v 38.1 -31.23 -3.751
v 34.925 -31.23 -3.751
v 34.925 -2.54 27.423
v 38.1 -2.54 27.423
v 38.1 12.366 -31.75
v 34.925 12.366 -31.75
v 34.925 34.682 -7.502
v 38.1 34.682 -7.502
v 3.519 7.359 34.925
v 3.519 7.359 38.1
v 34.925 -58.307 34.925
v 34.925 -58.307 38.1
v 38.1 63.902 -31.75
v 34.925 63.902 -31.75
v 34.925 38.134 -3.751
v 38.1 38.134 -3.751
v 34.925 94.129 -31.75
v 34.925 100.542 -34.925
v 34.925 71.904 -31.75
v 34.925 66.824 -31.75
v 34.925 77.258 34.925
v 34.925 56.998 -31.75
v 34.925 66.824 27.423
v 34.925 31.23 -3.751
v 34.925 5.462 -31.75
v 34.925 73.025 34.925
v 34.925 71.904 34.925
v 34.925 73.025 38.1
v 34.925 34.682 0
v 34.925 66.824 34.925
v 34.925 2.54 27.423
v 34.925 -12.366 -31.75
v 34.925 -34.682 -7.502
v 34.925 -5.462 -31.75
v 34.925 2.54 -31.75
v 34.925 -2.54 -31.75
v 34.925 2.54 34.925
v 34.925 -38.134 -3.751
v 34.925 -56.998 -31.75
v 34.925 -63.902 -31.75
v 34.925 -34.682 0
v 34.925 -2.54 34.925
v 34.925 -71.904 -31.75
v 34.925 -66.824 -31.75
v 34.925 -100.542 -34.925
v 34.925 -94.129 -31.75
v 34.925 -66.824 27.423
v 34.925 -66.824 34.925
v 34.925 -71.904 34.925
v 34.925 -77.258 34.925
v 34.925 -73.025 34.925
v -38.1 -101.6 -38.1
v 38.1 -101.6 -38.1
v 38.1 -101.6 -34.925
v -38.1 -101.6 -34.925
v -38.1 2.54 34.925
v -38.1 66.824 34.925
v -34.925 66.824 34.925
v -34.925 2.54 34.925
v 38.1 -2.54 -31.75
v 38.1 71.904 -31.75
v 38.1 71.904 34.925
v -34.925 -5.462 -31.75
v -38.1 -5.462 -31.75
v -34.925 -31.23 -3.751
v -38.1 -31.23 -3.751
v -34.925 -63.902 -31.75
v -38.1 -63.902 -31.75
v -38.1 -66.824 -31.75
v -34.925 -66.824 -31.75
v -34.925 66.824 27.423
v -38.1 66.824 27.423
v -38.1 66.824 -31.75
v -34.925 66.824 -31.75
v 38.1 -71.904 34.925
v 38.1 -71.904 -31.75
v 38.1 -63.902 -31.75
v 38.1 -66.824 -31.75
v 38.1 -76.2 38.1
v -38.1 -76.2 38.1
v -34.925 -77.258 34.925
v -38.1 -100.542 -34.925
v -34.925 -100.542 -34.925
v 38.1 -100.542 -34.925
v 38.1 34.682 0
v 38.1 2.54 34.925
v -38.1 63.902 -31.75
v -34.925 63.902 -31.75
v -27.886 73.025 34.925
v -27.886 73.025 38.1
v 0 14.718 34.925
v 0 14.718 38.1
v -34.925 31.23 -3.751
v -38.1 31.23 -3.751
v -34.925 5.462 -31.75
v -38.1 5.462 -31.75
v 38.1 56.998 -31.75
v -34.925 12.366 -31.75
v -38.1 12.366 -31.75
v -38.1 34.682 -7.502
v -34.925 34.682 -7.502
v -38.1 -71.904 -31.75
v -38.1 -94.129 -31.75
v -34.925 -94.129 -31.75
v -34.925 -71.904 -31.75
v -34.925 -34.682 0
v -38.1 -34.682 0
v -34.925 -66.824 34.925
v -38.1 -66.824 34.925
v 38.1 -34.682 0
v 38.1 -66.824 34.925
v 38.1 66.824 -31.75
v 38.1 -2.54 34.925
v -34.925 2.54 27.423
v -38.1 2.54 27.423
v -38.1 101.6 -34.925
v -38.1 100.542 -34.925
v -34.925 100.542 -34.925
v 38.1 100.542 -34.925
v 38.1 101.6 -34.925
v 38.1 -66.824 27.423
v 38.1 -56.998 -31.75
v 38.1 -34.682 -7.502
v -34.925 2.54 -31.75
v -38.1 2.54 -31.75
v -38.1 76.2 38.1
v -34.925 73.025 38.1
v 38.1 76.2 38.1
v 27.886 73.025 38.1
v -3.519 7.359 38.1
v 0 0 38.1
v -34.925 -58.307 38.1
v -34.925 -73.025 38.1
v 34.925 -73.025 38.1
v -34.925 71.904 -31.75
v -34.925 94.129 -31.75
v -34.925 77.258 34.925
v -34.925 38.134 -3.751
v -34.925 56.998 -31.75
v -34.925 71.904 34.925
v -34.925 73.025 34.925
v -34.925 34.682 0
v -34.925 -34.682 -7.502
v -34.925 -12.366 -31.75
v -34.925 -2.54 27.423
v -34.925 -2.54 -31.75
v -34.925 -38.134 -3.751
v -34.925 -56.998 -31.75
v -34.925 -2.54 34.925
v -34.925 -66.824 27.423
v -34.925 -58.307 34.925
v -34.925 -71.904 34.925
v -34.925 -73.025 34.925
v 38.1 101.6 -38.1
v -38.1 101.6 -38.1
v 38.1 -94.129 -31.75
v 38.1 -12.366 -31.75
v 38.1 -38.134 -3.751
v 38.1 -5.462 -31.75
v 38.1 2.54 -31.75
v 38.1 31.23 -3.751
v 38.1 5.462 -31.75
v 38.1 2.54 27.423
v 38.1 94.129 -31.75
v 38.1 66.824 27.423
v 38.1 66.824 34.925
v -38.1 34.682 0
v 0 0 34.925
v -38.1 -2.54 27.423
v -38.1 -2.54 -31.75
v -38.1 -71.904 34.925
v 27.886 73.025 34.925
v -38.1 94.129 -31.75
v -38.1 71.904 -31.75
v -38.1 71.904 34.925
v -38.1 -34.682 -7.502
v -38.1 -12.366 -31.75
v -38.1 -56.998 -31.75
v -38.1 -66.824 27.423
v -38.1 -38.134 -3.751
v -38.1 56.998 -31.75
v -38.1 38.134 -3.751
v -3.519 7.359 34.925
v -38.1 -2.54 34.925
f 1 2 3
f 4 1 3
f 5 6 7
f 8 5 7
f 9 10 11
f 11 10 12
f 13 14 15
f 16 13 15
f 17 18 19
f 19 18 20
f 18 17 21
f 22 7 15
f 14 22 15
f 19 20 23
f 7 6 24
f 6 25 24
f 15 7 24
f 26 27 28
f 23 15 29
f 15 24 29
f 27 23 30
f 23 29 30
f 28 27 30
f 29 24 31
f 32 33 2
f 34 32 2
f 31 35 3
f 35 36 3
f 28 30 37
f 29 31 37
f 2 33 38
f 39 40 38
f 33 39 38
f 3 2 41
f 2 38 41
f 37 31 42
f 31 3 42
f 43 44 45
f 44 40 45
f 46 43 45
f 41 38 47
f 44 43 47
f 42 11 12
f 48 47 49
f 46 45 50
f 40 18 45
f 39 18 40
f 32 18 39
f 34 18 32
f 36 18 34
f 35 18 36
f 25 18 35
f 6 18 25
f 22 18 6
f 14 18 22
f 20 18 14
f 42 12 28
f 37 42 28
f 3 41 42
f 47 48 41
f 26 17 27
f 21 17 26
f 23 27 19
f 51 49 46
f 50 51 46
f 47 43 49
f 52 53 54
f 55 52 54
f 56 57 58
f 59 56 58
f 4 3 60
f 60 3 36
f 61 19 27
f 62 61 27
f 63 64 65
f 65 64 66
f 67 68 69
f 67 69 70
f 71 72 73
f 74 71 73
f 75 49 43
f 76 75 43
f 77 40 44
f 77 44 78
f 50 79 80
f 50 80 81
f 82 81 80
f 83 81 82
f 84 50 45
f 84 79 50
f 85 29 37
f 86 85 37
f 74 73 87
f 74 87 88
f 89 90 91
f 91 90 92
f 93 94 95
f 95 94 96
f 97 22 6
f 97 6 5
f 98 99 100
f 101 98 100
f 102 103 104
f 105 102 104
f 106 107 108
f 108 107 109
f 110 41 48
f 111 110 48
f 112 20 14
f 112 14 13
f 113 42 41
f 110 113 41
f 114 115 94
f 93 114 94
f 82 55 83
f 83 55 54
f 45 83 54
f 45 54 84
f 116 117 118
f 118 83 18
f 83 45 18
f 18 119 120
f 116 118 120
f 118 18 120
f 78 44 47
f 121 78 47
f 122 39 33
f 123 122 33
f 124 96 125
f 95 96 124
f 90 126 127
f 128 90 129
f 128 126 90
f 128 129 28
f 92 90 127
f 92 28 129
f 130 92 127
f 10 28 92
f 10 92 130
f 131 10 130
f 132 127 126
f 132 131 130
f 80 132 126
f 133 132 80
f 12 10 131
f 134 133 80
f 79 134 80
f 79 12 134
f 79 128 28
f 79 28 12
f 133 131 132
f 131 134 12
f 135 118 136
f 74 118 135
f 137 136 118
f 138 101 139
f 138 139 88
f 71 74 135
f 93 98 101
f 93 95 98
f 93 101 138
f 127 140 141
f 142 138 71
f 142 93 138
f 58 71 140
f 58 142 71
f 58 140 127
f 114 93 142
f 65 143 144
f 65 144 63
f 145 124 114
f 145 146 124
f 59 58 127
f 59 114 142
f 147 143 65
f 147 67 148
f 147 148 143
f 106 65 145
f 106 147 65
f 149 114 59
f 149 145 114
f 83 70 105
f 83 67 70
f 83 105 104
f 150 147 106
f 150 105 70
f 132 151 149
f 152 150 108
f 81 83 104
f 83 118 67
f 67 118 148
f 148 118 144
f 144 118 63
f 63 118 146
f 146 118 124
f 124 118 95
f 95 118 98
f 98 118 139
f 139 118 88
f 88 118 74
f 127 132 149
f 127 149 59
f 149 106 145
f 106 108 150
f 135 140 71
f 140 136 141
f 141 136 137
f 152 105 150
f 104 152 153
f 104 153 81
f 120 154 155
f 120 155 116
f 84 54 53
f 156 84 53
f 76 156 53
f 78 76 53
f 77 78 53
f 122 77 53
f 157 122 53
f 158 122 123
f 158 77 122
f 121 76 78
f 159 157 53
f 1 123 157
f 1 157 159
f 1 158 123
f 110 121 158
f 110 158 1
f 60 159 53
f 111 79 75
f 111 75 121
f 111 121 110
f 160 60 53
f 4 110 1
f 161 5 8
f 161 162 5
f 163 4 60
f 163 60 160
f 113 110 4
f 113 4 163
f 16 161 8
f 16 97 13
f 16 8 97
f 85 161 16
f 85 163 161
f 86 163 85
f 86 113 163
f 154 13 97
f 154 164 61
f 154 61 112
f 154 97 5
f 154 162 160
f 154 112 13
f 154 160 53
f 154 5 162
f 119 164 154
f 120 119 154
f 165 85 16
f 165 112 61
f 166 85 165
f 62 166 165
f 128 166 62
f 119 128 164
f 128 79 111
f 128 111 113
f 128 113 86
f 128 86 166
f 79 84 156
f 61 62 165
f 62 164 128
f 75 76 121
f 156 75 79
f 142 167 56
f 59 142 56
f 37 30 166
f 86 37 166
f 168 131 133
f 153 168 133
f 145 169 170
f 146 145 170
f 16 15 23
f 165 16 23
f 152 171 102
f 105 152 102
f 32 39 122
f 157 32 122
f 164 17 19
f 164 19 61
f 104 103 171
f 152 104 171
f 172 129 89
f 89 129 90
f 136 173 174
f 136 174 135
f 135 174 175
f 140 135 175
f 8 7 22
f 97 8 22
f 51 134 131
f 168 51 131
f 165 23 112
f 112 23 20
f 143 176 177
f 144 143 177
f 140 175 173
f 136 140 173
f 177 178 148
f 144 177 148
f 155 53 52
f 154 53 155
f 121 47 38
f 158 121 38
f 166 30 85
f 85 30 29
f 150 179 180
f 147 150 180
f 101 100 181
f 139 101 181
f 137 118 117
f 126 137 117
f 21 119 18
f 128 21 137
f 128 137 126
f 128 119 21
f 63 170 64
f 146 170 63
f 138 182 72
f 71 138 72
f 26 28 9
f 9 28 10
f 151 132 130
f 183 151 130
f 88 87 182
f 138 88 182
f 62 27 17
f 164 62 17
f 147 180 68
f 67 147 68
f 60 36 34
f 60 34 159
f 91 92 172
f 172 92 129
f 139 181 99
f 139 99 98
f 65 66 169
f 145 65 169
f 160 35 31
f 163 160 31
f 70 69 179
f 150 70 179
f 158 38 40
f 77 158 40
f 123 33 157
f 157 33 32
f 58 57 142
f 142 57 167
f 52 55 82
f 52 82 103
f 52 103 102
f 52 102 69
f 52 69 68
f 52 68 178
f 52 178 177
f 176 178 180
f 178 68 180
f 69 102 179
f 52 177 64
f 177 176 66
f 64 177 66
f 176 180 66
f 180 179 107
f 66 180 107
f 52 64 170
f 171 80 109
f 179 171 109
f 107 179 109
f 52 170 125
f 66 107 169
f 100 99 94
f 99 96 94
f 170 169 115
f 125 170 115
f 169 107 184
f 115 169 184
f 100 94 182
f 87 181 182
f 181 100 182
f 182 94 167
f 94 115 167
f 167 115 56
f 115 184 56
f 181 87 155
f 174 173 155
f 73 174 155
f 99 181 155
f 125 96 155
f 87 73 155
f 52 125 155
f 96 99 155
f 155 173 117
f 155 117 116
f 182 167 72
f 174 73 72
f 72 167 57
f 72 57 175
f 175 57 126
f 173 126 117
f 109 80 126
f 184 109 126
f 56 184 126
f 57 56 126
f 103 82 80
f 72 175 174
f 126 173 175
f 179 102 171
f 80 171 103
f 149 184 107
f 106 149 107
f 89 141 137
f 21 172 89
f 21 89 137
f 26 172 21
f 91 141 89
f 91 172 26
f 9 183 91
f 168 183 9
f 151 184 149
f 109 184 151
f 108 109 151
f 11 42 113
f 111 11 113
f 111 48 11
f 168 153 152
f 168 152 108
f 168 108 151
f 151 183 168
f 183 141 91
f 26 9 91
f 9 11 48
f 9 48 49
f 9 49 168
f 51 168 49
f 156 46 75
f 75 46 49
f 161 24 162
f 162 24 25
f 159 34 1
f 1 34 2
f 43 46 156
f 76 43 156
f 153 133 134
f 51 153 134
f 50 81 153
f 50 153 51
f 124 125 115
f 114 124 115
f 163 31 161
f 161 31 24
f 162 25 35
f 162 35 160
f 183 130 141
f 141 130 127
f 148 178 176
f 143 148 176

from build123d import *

# Parameters (mm, degrees)
F1_DEPTH  = 38.1
F2_W      = 69.85
F2_H      = 69.85
F3_DEPTH  = 127
F5_DEPTH  = 76.2
F7_DEPTH  = 25.4
F8_W      = 3.175
F8_H      = 190.3737529909
F9_DEPTH  = 3.175
F10_W     = 4.2661567543
F10_H     = 3.175
F11_DEPTH = 76.2


with BuildPart() as f1:
    # F0 (on Right) → F1 (new body, symmetric)
    with BuildSketch(Plane.YZ):
        Polygon((-76.2, 38.1), (-101.6, -38.1), (101.6, -38.1), (76.2, 38.1), align=None)
    extrude(amount=F1_DEPTH, both=True)

    # F2 (on Front) → F3 (cut, symmetric)
    with BuildSketch(Plane.XZ):
        Rectangle(F2_W, F2_H)
    extrude(amount=F3_DEPTH, both=True, mode=Mode.SUBTRACT)

    # F4 (on face) → F5 (cut)
    with BuildSketch(Plane(origin=(-38.1, 0, 0), x_dir=(0, -1, 0), z_dir=(-1, 0, 0))):
        Polygon((-71.9035431621, 34.925), (-95.1868764954, -34.925), (-71.9035431621, -34.925), align=None)
        Polygon((-66.8235431621, 27.423295483), (-66.8235431621, -34.925), (-38.1337124981, -3.7508522585), align=None)
        Polygon((-2.54, 34.925), (-66.8235431621, 34.925), (-34.6817715811, 0), align=None)
        Polygon((-2.54, -34.925), (-2.54, 27.423295483), (-31.229830664, -3.7508522585), align=None)
        Polygon((-34.6817715811, -7.501704517), (-59.9196613281, -34.925), (-9.443881834, -34.925), align=None)
        Polygon((31.229830664, -3.7508522585), (2.54, 27.423295483), (2.54, -34.925), align=None)
        Polygon((66.8235431621, 34.925), (2.54, 34.925), (34.6817715811, 0), align=None)
        Polygon((66.8235431621, -34.925), (66.8235431621, 27.423295483), (38.1337124981, -3.7508522585), align=None)
        Polygon((34.6817715811, -7.501704517), (9.443881834, -34.925), (59.9196613281, -34.925), align=None)
        Polygon((95.1868764954, -34.925), (71.9035431621, 34.925), (71.9035431621, -34.925), align=None)
    extrude(amount=-F5_DEPTH, mode=Mode.SUBTRACT)

    # F6 (on face) → F7 (cut)
    with BuildSketch(Plane.XY.offset(38.1)):
        Polygon((-34.925, 73.025), (-34.925, -58.3073754949), (-3.5194319469, 7.3588122526), align=None)
        Polygon((-34.925, -73.025), (34.925, -73.025), (0, 0), align=None)
        Polygon((3.5194319469, 7.3588122526), (34.925, -58.3073754949), (34.925, 73.025), align=None)
        Polygon((0, 14.7176245051), (27.8861361062, 73.025), (-27.8861361062, 73.025), align=None)
    extrude(amount=-F7_DEPTH, mode=Mode.SUBTRACT)

    # F8 (on face) → F9 (join)
    with BuildSketch(Plane.XY.offset(-34.925)):
        with Locations((-36.5125, 0)):
            Rectangle(F8_W, F8_H)
        with Locations((36.5125, 0)):
            Rectangle(F8_W, F8_H)
    extrude(amount=F9_DEPTH)

    # F10 (on face) → F11 (join)
    with BuildSketch(Plane.YZ.offset(38.1)):
        with Locations((-99.4669216229, -36.5125)):
            Rectangle(F10_W, F10_H)
        with Locations((99.4669216229, -36.5125)):
            Rectangle(F10_W, F10_H)
    extrude(amount=-F11_DEPTH)


solid = f1.part
